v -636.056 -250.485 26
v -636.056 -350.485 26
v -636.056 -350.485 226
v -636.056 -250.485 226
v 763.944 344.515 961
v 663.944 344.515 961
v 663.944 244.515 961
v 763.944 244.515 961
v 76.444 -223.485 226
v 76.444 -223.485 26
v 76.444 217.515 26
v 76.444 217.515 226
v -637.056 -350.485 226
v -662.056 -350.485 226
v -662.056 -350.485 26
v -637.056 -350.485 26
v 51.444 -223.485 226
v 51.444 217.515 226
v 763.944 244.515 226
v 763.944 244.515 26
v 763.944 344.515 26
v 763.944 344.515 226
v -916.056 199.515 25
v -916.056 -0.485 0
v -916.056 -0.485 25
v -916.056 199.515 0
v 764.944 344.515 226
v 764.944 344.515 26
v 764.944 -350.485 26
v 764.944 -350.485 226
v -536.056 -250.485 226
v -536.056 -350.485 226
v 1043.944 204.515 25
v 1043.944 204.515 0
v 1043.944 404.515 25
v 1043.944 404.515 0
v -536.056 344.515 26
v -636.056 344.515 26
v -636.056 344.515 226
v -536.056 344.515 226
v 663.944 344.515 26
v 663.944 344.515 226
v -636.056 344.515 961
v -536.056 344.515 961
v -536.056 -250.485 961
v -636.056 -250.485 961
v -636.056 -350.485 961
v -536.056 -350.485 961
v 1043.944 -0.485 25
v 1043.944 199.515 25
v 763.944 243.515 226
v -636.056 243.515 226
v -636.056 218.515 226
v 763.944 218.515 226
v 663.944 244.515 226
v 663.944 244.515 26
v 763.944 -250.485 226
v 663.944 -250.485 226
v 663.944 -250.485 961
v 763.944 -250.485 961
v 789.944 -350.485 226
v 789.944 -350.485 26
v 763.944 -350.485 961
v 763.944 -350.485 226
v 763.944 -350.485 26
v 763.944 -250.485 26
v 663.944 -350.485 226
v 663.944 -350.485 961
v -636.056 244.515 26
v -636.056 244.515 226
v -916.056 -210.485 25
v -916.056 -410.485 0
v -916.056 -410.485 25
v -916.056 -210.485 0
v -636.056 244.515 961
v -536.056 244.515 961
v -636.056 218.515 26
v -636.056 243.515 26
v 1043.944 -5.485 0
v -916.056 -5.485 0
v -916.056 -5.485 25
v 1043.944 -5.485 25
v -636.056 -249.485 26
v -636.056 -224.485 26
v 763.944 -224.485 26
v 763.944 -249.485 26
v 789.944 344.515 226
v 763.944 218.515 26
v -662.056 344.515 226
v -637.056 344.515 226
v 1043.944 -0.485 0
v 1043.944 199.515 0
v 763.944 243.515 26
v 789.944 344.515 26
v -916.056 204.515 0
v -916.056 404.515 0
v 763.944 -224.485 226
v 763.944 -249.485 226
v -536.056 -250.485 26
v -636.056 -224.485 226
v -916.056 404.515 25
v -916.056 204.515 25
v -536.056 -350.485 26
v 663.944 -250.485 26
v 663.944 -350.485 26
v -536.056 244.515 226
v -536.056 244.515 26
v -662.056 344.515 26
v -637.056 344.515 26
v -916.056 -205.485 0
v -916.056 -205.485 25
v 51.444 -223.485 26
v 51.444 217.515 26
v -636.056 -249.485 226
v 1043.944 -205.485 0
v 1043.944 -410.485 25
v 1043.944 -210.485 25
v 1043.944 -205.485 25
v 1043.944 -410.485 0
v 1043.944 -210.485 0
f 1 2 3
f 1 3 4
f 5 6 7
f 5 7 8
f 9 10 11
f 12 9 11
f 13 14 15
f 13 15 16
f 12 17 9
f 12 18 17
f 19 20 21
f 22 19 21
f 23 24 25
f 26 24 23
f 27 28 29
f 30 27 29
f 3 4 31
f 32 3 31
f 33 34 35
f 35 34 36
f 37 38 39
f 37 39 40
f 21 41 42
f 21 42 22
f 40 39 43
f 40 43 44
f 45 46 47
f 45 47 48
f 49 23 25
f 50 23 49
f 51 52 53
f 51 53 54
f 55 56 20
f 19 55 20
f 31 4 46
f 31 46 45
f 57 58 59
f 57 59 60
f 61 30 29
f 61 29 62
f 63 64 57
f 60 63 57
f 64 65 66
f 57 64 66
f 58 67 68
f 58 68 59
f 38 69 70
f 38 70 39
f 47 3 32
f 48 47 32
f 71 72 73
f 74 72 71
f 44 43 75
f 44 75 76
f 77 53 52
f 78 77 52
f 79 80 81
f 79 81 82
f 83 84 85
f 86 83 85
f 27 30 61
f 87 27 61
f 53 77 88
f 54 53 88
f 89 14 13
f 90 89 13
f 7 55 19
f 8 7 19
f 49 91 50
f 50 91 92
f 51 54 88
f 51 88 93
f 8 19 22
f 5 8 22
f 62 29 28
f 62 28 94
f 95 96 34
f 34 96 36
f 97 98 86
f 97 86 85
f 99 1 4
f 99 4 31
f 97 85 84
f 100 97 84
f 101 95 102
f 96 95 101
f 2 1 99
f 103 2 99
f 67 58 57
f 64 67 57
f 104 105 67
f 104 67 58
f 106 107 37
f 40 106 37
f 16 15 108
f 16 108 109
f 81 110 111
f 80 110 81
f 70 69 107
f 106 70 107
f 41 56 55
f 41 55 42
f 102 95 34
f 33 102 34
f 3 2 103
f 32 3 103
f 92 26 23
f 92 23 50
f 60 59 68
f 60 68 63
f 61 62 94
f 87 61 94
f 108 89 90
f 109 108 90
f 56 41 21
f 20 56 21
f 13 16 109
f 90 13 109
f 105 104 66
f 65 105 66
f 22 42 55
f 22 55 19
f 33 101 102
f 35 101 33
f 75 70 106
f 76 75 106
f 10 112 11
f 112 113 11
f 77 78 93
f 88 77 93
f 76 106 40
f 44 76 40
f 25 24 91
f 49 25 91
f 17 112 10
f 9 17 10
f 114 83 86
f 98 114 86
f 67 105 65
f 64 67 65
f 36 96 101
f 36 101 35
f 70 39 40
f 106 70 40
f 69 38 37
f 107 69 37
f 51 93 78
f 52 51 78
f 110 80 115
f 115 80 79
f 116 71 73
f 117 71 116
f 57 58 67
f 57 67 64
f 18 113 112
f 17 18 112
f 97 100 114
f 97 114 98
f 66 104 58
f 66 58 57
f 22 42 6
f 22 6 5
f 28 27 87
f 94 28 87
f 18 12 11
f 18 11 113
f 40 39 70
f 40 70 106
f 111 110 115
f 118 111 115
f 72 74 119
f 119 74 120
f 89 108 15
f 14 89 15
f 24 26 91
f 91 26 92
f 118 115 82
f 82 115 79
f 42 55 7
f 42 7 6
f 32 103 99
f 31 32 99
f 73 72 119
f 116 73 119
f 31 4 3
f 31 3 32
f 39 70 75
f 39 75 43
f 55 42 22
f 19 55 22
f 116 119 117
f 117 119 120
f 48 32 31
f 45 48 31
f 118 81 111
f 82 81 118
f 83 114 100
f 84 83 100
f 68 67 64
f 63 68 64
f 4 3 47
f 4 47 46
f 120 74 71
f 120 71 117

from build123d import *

# Parameters (mm, degrees)
F0_W     = 1960
F0_H     = 200
F1_DEPTH = 25
F3_W     = 100
F3_H     = 100
F4_DEPTH = 200
F3_W_2   = 700
F3_H_2   = 25
F3_W_3   = 25
F3_H_3   = 347.5
F3_W_4   = 12.5
F3_H_4   = 220.5
F5_DEPTH = 735


with BuildPart() as f1:
    # F0 (on Top) → F1 (new body)
    with BuildSketch(Plane.XY):
        with Locations((63.9439821243, -310.4851912497)):
            Rectangle(F0_W, F0_H)
    extrude(amount=F1_DEPTH)


with BuildPart() as f1b:
    # F0 (on Top) → F1, piece 2 (new body)
    with BuildSketch(Plane.XY):
        with Locations((63.9439821243, -105.4851912497)):
            Rectangle(F0_W, F0_H)
    extrude(amount=F1_DEPTH)


with BuildPart() as f1c:
    # F0 (on Top) → F1, piece 3 (new body)
    with BuildSketch(Plane.XY):
        with Locations((63.9439821243, 99.5148087503)):
            Rectangle(F0_W, F0_H)
    extrude(amount=F1_DEPTH)


with BuildPart() as f1d:
    # F0 (on Top) → F1, piece 4 (new body)
    with BuildSketch(Plane.XY):
        with Locations((63.9439821243, 304.5148087503)):
            Rectangle(F0_W, F0_H)
    extrude(amount=F1_DEPTH)


with BuildPart() as f4:
    # F3 (on offset) → F4 (new body)
    with BuildSketch(Plane.XY.offset(26)):
        with Locations((-586.0560178757, 294.5148087503)):
            Rectangle(F3_W, F3_H)
    extrude(amount=F4_DEPTH)


with BuildPart() as f4b:
    # F3 (on offset) → F4, piece 2 (new body)
    with BuildSketch(Plane.XY.offset(26)):
        with Locations((-286.0560178757, 231.0148087503)):
            Rectangle(F3_W_2, F3_H_2)
        with Locations((413.9439821243, 231.0148087503)):
            Rectangle(F3_W_2, F3_H_2)
    extrude(amount=F4_DEPTH)


with BuildPart() as f4c:
    # F3 (on offset) → F4, piece 3 (new body)
    with BuildSketch(Plane.XY.offset(26)):
        with Locations((-649.5560178757, 170.7648087503)):
            Rectangle(F3_W_3, F3_H_3)
        with Locations((-649.5560178757, -176.7351912497)):
            Rectangle(F3_W_3, F3_H_3)
    extrude(amount=F4_DEPTH)


with BuildPart() as f4d:
    # F3 (on offset) → F4, piece 4 (new body)
    with BuildSketch(Plane.XY.offset(26)):
        with Locations((57.6939821243, -113.2351912497)):
            Rectangle(F3_W_4, F3_H_4)
        with Locations((57.6939821243, 107.2648087503)):
            Rectangle(F3_W_4, F3_H_4)
        with Locations((70.1939821243, 107.2648087503)):
            Rectangle(F3_W_4, F3_H_4)
        with Locations((70.1939821243, -113.2351912497)):
            Rectangle(F3_W_4, F3_H_4)
    extrude(amount=F4_DEPTH)


with BuildPart() as f4e:
    # F3 (on offset) → F4, piece 5 (new body)
    with BuildSketch(Plane.XY.offset(26)):
        with Locations((777.4439821243, -176.7351912497)):
            Rectangle(F3_W_3, F3_H_3)
        with Locations((777.4439821243, 170.7648087503)):
            Rectangle(F3_W_3, F3_H_3)
    extrude(amount=F4_DEPTH)


with BuildPart() as f4f:
    # F3 (on offset) → F4, piece 6 (new body)
    with BuildSketch(Plane.XY.offset(26)):
        with Locations((713.9439821243, 294.5148087503)):
            Rectangle(F3_W, F3_H)
    extrude(amount=F4_DEPTH)


with BuildPart() as f4g:
    # F3 (on offset) → F4, piece 7 (new body)
    with BuildSketch(Plane.XY.offset(26)):
        with Locations((413.9439821243, -236.9851912497)):
            Rectangle(F3_W_2, F3_H_2)
        with Locations((-286.0560178757, -236.9851912497)):
            Rectangle(F3_W_2, F3_H_2)
    extrude(amount=F4_DEPTH)


with BuildPart() as f4h:
    # F3 (on offset) → F4, piece 8 (new body)
    with BuildSketch(Plane.XY.offset(26)):
        with Locations((-586.0560178757, -300.4851912497)):
            Rectangle(F3_W, F3_H)
    extrude(amount=F4_DEPTH)


with BuildPart() as f4i:
    # F3 (on offset) → F4, piece 9 (new body)
    with BuildSketch(Plane.XY.offset(26)):
        with Locations((713.9439821243, -300.4851912497)):
            Rectangle(F3_W, F3_H)
    extrude(amount=F4_DEPTH)


with BuildPart() as f5:
    # F5 (new): a face of the model
    f5_faces = [f4h.part.faces().sort_by_distance(p)[0] for p in [
        (-586.0560178757, -300.4851912497, 226),
    ]]
    extrude(f5_faces, amount=F5_DEPTH)


with BuildPart() as f5b:
    # F5#2 (new): a face of the model
    f5_2_faces = [f4.part.faces().sort_by_distance(p)[0] for p in [
        (-586.0560178757, 294.5148087503, 226),
    ]]
    extrude(f5_2_faces, amount=F5_DEPTH)


with BuildPart() as f5c:
    # F5#3 (new): a face of the model
    f5_3_faces = [f4f.part.faces().sort_by_distance(p)[0] for p in [
        (713.9439821243, 294.5148087503, 226),
    ]]
    extrude(f5_3_faces, amount=F5_DEPTH)


with BuildPart() as f5d:
    # F5#4 (new): a face of the model
    f5_4_faces = [f4i.part.faces().sort_by_distance(p)[0] for p in [
        (713.9439821243, -300.4851912497, 226),
    ]]
    extrude(f5_4_faces, amount=F5_DEPTH)


solid = Compound([f1.part, f1b.part, f1c.part, f1d.part, f4.part, f4b.part, f4c.part, f4d.part, f4e.part, f4f.part, f4g.part, f4h.part, f4i.part, f5.part, f5b.part, f5c.part, f5d.part])
